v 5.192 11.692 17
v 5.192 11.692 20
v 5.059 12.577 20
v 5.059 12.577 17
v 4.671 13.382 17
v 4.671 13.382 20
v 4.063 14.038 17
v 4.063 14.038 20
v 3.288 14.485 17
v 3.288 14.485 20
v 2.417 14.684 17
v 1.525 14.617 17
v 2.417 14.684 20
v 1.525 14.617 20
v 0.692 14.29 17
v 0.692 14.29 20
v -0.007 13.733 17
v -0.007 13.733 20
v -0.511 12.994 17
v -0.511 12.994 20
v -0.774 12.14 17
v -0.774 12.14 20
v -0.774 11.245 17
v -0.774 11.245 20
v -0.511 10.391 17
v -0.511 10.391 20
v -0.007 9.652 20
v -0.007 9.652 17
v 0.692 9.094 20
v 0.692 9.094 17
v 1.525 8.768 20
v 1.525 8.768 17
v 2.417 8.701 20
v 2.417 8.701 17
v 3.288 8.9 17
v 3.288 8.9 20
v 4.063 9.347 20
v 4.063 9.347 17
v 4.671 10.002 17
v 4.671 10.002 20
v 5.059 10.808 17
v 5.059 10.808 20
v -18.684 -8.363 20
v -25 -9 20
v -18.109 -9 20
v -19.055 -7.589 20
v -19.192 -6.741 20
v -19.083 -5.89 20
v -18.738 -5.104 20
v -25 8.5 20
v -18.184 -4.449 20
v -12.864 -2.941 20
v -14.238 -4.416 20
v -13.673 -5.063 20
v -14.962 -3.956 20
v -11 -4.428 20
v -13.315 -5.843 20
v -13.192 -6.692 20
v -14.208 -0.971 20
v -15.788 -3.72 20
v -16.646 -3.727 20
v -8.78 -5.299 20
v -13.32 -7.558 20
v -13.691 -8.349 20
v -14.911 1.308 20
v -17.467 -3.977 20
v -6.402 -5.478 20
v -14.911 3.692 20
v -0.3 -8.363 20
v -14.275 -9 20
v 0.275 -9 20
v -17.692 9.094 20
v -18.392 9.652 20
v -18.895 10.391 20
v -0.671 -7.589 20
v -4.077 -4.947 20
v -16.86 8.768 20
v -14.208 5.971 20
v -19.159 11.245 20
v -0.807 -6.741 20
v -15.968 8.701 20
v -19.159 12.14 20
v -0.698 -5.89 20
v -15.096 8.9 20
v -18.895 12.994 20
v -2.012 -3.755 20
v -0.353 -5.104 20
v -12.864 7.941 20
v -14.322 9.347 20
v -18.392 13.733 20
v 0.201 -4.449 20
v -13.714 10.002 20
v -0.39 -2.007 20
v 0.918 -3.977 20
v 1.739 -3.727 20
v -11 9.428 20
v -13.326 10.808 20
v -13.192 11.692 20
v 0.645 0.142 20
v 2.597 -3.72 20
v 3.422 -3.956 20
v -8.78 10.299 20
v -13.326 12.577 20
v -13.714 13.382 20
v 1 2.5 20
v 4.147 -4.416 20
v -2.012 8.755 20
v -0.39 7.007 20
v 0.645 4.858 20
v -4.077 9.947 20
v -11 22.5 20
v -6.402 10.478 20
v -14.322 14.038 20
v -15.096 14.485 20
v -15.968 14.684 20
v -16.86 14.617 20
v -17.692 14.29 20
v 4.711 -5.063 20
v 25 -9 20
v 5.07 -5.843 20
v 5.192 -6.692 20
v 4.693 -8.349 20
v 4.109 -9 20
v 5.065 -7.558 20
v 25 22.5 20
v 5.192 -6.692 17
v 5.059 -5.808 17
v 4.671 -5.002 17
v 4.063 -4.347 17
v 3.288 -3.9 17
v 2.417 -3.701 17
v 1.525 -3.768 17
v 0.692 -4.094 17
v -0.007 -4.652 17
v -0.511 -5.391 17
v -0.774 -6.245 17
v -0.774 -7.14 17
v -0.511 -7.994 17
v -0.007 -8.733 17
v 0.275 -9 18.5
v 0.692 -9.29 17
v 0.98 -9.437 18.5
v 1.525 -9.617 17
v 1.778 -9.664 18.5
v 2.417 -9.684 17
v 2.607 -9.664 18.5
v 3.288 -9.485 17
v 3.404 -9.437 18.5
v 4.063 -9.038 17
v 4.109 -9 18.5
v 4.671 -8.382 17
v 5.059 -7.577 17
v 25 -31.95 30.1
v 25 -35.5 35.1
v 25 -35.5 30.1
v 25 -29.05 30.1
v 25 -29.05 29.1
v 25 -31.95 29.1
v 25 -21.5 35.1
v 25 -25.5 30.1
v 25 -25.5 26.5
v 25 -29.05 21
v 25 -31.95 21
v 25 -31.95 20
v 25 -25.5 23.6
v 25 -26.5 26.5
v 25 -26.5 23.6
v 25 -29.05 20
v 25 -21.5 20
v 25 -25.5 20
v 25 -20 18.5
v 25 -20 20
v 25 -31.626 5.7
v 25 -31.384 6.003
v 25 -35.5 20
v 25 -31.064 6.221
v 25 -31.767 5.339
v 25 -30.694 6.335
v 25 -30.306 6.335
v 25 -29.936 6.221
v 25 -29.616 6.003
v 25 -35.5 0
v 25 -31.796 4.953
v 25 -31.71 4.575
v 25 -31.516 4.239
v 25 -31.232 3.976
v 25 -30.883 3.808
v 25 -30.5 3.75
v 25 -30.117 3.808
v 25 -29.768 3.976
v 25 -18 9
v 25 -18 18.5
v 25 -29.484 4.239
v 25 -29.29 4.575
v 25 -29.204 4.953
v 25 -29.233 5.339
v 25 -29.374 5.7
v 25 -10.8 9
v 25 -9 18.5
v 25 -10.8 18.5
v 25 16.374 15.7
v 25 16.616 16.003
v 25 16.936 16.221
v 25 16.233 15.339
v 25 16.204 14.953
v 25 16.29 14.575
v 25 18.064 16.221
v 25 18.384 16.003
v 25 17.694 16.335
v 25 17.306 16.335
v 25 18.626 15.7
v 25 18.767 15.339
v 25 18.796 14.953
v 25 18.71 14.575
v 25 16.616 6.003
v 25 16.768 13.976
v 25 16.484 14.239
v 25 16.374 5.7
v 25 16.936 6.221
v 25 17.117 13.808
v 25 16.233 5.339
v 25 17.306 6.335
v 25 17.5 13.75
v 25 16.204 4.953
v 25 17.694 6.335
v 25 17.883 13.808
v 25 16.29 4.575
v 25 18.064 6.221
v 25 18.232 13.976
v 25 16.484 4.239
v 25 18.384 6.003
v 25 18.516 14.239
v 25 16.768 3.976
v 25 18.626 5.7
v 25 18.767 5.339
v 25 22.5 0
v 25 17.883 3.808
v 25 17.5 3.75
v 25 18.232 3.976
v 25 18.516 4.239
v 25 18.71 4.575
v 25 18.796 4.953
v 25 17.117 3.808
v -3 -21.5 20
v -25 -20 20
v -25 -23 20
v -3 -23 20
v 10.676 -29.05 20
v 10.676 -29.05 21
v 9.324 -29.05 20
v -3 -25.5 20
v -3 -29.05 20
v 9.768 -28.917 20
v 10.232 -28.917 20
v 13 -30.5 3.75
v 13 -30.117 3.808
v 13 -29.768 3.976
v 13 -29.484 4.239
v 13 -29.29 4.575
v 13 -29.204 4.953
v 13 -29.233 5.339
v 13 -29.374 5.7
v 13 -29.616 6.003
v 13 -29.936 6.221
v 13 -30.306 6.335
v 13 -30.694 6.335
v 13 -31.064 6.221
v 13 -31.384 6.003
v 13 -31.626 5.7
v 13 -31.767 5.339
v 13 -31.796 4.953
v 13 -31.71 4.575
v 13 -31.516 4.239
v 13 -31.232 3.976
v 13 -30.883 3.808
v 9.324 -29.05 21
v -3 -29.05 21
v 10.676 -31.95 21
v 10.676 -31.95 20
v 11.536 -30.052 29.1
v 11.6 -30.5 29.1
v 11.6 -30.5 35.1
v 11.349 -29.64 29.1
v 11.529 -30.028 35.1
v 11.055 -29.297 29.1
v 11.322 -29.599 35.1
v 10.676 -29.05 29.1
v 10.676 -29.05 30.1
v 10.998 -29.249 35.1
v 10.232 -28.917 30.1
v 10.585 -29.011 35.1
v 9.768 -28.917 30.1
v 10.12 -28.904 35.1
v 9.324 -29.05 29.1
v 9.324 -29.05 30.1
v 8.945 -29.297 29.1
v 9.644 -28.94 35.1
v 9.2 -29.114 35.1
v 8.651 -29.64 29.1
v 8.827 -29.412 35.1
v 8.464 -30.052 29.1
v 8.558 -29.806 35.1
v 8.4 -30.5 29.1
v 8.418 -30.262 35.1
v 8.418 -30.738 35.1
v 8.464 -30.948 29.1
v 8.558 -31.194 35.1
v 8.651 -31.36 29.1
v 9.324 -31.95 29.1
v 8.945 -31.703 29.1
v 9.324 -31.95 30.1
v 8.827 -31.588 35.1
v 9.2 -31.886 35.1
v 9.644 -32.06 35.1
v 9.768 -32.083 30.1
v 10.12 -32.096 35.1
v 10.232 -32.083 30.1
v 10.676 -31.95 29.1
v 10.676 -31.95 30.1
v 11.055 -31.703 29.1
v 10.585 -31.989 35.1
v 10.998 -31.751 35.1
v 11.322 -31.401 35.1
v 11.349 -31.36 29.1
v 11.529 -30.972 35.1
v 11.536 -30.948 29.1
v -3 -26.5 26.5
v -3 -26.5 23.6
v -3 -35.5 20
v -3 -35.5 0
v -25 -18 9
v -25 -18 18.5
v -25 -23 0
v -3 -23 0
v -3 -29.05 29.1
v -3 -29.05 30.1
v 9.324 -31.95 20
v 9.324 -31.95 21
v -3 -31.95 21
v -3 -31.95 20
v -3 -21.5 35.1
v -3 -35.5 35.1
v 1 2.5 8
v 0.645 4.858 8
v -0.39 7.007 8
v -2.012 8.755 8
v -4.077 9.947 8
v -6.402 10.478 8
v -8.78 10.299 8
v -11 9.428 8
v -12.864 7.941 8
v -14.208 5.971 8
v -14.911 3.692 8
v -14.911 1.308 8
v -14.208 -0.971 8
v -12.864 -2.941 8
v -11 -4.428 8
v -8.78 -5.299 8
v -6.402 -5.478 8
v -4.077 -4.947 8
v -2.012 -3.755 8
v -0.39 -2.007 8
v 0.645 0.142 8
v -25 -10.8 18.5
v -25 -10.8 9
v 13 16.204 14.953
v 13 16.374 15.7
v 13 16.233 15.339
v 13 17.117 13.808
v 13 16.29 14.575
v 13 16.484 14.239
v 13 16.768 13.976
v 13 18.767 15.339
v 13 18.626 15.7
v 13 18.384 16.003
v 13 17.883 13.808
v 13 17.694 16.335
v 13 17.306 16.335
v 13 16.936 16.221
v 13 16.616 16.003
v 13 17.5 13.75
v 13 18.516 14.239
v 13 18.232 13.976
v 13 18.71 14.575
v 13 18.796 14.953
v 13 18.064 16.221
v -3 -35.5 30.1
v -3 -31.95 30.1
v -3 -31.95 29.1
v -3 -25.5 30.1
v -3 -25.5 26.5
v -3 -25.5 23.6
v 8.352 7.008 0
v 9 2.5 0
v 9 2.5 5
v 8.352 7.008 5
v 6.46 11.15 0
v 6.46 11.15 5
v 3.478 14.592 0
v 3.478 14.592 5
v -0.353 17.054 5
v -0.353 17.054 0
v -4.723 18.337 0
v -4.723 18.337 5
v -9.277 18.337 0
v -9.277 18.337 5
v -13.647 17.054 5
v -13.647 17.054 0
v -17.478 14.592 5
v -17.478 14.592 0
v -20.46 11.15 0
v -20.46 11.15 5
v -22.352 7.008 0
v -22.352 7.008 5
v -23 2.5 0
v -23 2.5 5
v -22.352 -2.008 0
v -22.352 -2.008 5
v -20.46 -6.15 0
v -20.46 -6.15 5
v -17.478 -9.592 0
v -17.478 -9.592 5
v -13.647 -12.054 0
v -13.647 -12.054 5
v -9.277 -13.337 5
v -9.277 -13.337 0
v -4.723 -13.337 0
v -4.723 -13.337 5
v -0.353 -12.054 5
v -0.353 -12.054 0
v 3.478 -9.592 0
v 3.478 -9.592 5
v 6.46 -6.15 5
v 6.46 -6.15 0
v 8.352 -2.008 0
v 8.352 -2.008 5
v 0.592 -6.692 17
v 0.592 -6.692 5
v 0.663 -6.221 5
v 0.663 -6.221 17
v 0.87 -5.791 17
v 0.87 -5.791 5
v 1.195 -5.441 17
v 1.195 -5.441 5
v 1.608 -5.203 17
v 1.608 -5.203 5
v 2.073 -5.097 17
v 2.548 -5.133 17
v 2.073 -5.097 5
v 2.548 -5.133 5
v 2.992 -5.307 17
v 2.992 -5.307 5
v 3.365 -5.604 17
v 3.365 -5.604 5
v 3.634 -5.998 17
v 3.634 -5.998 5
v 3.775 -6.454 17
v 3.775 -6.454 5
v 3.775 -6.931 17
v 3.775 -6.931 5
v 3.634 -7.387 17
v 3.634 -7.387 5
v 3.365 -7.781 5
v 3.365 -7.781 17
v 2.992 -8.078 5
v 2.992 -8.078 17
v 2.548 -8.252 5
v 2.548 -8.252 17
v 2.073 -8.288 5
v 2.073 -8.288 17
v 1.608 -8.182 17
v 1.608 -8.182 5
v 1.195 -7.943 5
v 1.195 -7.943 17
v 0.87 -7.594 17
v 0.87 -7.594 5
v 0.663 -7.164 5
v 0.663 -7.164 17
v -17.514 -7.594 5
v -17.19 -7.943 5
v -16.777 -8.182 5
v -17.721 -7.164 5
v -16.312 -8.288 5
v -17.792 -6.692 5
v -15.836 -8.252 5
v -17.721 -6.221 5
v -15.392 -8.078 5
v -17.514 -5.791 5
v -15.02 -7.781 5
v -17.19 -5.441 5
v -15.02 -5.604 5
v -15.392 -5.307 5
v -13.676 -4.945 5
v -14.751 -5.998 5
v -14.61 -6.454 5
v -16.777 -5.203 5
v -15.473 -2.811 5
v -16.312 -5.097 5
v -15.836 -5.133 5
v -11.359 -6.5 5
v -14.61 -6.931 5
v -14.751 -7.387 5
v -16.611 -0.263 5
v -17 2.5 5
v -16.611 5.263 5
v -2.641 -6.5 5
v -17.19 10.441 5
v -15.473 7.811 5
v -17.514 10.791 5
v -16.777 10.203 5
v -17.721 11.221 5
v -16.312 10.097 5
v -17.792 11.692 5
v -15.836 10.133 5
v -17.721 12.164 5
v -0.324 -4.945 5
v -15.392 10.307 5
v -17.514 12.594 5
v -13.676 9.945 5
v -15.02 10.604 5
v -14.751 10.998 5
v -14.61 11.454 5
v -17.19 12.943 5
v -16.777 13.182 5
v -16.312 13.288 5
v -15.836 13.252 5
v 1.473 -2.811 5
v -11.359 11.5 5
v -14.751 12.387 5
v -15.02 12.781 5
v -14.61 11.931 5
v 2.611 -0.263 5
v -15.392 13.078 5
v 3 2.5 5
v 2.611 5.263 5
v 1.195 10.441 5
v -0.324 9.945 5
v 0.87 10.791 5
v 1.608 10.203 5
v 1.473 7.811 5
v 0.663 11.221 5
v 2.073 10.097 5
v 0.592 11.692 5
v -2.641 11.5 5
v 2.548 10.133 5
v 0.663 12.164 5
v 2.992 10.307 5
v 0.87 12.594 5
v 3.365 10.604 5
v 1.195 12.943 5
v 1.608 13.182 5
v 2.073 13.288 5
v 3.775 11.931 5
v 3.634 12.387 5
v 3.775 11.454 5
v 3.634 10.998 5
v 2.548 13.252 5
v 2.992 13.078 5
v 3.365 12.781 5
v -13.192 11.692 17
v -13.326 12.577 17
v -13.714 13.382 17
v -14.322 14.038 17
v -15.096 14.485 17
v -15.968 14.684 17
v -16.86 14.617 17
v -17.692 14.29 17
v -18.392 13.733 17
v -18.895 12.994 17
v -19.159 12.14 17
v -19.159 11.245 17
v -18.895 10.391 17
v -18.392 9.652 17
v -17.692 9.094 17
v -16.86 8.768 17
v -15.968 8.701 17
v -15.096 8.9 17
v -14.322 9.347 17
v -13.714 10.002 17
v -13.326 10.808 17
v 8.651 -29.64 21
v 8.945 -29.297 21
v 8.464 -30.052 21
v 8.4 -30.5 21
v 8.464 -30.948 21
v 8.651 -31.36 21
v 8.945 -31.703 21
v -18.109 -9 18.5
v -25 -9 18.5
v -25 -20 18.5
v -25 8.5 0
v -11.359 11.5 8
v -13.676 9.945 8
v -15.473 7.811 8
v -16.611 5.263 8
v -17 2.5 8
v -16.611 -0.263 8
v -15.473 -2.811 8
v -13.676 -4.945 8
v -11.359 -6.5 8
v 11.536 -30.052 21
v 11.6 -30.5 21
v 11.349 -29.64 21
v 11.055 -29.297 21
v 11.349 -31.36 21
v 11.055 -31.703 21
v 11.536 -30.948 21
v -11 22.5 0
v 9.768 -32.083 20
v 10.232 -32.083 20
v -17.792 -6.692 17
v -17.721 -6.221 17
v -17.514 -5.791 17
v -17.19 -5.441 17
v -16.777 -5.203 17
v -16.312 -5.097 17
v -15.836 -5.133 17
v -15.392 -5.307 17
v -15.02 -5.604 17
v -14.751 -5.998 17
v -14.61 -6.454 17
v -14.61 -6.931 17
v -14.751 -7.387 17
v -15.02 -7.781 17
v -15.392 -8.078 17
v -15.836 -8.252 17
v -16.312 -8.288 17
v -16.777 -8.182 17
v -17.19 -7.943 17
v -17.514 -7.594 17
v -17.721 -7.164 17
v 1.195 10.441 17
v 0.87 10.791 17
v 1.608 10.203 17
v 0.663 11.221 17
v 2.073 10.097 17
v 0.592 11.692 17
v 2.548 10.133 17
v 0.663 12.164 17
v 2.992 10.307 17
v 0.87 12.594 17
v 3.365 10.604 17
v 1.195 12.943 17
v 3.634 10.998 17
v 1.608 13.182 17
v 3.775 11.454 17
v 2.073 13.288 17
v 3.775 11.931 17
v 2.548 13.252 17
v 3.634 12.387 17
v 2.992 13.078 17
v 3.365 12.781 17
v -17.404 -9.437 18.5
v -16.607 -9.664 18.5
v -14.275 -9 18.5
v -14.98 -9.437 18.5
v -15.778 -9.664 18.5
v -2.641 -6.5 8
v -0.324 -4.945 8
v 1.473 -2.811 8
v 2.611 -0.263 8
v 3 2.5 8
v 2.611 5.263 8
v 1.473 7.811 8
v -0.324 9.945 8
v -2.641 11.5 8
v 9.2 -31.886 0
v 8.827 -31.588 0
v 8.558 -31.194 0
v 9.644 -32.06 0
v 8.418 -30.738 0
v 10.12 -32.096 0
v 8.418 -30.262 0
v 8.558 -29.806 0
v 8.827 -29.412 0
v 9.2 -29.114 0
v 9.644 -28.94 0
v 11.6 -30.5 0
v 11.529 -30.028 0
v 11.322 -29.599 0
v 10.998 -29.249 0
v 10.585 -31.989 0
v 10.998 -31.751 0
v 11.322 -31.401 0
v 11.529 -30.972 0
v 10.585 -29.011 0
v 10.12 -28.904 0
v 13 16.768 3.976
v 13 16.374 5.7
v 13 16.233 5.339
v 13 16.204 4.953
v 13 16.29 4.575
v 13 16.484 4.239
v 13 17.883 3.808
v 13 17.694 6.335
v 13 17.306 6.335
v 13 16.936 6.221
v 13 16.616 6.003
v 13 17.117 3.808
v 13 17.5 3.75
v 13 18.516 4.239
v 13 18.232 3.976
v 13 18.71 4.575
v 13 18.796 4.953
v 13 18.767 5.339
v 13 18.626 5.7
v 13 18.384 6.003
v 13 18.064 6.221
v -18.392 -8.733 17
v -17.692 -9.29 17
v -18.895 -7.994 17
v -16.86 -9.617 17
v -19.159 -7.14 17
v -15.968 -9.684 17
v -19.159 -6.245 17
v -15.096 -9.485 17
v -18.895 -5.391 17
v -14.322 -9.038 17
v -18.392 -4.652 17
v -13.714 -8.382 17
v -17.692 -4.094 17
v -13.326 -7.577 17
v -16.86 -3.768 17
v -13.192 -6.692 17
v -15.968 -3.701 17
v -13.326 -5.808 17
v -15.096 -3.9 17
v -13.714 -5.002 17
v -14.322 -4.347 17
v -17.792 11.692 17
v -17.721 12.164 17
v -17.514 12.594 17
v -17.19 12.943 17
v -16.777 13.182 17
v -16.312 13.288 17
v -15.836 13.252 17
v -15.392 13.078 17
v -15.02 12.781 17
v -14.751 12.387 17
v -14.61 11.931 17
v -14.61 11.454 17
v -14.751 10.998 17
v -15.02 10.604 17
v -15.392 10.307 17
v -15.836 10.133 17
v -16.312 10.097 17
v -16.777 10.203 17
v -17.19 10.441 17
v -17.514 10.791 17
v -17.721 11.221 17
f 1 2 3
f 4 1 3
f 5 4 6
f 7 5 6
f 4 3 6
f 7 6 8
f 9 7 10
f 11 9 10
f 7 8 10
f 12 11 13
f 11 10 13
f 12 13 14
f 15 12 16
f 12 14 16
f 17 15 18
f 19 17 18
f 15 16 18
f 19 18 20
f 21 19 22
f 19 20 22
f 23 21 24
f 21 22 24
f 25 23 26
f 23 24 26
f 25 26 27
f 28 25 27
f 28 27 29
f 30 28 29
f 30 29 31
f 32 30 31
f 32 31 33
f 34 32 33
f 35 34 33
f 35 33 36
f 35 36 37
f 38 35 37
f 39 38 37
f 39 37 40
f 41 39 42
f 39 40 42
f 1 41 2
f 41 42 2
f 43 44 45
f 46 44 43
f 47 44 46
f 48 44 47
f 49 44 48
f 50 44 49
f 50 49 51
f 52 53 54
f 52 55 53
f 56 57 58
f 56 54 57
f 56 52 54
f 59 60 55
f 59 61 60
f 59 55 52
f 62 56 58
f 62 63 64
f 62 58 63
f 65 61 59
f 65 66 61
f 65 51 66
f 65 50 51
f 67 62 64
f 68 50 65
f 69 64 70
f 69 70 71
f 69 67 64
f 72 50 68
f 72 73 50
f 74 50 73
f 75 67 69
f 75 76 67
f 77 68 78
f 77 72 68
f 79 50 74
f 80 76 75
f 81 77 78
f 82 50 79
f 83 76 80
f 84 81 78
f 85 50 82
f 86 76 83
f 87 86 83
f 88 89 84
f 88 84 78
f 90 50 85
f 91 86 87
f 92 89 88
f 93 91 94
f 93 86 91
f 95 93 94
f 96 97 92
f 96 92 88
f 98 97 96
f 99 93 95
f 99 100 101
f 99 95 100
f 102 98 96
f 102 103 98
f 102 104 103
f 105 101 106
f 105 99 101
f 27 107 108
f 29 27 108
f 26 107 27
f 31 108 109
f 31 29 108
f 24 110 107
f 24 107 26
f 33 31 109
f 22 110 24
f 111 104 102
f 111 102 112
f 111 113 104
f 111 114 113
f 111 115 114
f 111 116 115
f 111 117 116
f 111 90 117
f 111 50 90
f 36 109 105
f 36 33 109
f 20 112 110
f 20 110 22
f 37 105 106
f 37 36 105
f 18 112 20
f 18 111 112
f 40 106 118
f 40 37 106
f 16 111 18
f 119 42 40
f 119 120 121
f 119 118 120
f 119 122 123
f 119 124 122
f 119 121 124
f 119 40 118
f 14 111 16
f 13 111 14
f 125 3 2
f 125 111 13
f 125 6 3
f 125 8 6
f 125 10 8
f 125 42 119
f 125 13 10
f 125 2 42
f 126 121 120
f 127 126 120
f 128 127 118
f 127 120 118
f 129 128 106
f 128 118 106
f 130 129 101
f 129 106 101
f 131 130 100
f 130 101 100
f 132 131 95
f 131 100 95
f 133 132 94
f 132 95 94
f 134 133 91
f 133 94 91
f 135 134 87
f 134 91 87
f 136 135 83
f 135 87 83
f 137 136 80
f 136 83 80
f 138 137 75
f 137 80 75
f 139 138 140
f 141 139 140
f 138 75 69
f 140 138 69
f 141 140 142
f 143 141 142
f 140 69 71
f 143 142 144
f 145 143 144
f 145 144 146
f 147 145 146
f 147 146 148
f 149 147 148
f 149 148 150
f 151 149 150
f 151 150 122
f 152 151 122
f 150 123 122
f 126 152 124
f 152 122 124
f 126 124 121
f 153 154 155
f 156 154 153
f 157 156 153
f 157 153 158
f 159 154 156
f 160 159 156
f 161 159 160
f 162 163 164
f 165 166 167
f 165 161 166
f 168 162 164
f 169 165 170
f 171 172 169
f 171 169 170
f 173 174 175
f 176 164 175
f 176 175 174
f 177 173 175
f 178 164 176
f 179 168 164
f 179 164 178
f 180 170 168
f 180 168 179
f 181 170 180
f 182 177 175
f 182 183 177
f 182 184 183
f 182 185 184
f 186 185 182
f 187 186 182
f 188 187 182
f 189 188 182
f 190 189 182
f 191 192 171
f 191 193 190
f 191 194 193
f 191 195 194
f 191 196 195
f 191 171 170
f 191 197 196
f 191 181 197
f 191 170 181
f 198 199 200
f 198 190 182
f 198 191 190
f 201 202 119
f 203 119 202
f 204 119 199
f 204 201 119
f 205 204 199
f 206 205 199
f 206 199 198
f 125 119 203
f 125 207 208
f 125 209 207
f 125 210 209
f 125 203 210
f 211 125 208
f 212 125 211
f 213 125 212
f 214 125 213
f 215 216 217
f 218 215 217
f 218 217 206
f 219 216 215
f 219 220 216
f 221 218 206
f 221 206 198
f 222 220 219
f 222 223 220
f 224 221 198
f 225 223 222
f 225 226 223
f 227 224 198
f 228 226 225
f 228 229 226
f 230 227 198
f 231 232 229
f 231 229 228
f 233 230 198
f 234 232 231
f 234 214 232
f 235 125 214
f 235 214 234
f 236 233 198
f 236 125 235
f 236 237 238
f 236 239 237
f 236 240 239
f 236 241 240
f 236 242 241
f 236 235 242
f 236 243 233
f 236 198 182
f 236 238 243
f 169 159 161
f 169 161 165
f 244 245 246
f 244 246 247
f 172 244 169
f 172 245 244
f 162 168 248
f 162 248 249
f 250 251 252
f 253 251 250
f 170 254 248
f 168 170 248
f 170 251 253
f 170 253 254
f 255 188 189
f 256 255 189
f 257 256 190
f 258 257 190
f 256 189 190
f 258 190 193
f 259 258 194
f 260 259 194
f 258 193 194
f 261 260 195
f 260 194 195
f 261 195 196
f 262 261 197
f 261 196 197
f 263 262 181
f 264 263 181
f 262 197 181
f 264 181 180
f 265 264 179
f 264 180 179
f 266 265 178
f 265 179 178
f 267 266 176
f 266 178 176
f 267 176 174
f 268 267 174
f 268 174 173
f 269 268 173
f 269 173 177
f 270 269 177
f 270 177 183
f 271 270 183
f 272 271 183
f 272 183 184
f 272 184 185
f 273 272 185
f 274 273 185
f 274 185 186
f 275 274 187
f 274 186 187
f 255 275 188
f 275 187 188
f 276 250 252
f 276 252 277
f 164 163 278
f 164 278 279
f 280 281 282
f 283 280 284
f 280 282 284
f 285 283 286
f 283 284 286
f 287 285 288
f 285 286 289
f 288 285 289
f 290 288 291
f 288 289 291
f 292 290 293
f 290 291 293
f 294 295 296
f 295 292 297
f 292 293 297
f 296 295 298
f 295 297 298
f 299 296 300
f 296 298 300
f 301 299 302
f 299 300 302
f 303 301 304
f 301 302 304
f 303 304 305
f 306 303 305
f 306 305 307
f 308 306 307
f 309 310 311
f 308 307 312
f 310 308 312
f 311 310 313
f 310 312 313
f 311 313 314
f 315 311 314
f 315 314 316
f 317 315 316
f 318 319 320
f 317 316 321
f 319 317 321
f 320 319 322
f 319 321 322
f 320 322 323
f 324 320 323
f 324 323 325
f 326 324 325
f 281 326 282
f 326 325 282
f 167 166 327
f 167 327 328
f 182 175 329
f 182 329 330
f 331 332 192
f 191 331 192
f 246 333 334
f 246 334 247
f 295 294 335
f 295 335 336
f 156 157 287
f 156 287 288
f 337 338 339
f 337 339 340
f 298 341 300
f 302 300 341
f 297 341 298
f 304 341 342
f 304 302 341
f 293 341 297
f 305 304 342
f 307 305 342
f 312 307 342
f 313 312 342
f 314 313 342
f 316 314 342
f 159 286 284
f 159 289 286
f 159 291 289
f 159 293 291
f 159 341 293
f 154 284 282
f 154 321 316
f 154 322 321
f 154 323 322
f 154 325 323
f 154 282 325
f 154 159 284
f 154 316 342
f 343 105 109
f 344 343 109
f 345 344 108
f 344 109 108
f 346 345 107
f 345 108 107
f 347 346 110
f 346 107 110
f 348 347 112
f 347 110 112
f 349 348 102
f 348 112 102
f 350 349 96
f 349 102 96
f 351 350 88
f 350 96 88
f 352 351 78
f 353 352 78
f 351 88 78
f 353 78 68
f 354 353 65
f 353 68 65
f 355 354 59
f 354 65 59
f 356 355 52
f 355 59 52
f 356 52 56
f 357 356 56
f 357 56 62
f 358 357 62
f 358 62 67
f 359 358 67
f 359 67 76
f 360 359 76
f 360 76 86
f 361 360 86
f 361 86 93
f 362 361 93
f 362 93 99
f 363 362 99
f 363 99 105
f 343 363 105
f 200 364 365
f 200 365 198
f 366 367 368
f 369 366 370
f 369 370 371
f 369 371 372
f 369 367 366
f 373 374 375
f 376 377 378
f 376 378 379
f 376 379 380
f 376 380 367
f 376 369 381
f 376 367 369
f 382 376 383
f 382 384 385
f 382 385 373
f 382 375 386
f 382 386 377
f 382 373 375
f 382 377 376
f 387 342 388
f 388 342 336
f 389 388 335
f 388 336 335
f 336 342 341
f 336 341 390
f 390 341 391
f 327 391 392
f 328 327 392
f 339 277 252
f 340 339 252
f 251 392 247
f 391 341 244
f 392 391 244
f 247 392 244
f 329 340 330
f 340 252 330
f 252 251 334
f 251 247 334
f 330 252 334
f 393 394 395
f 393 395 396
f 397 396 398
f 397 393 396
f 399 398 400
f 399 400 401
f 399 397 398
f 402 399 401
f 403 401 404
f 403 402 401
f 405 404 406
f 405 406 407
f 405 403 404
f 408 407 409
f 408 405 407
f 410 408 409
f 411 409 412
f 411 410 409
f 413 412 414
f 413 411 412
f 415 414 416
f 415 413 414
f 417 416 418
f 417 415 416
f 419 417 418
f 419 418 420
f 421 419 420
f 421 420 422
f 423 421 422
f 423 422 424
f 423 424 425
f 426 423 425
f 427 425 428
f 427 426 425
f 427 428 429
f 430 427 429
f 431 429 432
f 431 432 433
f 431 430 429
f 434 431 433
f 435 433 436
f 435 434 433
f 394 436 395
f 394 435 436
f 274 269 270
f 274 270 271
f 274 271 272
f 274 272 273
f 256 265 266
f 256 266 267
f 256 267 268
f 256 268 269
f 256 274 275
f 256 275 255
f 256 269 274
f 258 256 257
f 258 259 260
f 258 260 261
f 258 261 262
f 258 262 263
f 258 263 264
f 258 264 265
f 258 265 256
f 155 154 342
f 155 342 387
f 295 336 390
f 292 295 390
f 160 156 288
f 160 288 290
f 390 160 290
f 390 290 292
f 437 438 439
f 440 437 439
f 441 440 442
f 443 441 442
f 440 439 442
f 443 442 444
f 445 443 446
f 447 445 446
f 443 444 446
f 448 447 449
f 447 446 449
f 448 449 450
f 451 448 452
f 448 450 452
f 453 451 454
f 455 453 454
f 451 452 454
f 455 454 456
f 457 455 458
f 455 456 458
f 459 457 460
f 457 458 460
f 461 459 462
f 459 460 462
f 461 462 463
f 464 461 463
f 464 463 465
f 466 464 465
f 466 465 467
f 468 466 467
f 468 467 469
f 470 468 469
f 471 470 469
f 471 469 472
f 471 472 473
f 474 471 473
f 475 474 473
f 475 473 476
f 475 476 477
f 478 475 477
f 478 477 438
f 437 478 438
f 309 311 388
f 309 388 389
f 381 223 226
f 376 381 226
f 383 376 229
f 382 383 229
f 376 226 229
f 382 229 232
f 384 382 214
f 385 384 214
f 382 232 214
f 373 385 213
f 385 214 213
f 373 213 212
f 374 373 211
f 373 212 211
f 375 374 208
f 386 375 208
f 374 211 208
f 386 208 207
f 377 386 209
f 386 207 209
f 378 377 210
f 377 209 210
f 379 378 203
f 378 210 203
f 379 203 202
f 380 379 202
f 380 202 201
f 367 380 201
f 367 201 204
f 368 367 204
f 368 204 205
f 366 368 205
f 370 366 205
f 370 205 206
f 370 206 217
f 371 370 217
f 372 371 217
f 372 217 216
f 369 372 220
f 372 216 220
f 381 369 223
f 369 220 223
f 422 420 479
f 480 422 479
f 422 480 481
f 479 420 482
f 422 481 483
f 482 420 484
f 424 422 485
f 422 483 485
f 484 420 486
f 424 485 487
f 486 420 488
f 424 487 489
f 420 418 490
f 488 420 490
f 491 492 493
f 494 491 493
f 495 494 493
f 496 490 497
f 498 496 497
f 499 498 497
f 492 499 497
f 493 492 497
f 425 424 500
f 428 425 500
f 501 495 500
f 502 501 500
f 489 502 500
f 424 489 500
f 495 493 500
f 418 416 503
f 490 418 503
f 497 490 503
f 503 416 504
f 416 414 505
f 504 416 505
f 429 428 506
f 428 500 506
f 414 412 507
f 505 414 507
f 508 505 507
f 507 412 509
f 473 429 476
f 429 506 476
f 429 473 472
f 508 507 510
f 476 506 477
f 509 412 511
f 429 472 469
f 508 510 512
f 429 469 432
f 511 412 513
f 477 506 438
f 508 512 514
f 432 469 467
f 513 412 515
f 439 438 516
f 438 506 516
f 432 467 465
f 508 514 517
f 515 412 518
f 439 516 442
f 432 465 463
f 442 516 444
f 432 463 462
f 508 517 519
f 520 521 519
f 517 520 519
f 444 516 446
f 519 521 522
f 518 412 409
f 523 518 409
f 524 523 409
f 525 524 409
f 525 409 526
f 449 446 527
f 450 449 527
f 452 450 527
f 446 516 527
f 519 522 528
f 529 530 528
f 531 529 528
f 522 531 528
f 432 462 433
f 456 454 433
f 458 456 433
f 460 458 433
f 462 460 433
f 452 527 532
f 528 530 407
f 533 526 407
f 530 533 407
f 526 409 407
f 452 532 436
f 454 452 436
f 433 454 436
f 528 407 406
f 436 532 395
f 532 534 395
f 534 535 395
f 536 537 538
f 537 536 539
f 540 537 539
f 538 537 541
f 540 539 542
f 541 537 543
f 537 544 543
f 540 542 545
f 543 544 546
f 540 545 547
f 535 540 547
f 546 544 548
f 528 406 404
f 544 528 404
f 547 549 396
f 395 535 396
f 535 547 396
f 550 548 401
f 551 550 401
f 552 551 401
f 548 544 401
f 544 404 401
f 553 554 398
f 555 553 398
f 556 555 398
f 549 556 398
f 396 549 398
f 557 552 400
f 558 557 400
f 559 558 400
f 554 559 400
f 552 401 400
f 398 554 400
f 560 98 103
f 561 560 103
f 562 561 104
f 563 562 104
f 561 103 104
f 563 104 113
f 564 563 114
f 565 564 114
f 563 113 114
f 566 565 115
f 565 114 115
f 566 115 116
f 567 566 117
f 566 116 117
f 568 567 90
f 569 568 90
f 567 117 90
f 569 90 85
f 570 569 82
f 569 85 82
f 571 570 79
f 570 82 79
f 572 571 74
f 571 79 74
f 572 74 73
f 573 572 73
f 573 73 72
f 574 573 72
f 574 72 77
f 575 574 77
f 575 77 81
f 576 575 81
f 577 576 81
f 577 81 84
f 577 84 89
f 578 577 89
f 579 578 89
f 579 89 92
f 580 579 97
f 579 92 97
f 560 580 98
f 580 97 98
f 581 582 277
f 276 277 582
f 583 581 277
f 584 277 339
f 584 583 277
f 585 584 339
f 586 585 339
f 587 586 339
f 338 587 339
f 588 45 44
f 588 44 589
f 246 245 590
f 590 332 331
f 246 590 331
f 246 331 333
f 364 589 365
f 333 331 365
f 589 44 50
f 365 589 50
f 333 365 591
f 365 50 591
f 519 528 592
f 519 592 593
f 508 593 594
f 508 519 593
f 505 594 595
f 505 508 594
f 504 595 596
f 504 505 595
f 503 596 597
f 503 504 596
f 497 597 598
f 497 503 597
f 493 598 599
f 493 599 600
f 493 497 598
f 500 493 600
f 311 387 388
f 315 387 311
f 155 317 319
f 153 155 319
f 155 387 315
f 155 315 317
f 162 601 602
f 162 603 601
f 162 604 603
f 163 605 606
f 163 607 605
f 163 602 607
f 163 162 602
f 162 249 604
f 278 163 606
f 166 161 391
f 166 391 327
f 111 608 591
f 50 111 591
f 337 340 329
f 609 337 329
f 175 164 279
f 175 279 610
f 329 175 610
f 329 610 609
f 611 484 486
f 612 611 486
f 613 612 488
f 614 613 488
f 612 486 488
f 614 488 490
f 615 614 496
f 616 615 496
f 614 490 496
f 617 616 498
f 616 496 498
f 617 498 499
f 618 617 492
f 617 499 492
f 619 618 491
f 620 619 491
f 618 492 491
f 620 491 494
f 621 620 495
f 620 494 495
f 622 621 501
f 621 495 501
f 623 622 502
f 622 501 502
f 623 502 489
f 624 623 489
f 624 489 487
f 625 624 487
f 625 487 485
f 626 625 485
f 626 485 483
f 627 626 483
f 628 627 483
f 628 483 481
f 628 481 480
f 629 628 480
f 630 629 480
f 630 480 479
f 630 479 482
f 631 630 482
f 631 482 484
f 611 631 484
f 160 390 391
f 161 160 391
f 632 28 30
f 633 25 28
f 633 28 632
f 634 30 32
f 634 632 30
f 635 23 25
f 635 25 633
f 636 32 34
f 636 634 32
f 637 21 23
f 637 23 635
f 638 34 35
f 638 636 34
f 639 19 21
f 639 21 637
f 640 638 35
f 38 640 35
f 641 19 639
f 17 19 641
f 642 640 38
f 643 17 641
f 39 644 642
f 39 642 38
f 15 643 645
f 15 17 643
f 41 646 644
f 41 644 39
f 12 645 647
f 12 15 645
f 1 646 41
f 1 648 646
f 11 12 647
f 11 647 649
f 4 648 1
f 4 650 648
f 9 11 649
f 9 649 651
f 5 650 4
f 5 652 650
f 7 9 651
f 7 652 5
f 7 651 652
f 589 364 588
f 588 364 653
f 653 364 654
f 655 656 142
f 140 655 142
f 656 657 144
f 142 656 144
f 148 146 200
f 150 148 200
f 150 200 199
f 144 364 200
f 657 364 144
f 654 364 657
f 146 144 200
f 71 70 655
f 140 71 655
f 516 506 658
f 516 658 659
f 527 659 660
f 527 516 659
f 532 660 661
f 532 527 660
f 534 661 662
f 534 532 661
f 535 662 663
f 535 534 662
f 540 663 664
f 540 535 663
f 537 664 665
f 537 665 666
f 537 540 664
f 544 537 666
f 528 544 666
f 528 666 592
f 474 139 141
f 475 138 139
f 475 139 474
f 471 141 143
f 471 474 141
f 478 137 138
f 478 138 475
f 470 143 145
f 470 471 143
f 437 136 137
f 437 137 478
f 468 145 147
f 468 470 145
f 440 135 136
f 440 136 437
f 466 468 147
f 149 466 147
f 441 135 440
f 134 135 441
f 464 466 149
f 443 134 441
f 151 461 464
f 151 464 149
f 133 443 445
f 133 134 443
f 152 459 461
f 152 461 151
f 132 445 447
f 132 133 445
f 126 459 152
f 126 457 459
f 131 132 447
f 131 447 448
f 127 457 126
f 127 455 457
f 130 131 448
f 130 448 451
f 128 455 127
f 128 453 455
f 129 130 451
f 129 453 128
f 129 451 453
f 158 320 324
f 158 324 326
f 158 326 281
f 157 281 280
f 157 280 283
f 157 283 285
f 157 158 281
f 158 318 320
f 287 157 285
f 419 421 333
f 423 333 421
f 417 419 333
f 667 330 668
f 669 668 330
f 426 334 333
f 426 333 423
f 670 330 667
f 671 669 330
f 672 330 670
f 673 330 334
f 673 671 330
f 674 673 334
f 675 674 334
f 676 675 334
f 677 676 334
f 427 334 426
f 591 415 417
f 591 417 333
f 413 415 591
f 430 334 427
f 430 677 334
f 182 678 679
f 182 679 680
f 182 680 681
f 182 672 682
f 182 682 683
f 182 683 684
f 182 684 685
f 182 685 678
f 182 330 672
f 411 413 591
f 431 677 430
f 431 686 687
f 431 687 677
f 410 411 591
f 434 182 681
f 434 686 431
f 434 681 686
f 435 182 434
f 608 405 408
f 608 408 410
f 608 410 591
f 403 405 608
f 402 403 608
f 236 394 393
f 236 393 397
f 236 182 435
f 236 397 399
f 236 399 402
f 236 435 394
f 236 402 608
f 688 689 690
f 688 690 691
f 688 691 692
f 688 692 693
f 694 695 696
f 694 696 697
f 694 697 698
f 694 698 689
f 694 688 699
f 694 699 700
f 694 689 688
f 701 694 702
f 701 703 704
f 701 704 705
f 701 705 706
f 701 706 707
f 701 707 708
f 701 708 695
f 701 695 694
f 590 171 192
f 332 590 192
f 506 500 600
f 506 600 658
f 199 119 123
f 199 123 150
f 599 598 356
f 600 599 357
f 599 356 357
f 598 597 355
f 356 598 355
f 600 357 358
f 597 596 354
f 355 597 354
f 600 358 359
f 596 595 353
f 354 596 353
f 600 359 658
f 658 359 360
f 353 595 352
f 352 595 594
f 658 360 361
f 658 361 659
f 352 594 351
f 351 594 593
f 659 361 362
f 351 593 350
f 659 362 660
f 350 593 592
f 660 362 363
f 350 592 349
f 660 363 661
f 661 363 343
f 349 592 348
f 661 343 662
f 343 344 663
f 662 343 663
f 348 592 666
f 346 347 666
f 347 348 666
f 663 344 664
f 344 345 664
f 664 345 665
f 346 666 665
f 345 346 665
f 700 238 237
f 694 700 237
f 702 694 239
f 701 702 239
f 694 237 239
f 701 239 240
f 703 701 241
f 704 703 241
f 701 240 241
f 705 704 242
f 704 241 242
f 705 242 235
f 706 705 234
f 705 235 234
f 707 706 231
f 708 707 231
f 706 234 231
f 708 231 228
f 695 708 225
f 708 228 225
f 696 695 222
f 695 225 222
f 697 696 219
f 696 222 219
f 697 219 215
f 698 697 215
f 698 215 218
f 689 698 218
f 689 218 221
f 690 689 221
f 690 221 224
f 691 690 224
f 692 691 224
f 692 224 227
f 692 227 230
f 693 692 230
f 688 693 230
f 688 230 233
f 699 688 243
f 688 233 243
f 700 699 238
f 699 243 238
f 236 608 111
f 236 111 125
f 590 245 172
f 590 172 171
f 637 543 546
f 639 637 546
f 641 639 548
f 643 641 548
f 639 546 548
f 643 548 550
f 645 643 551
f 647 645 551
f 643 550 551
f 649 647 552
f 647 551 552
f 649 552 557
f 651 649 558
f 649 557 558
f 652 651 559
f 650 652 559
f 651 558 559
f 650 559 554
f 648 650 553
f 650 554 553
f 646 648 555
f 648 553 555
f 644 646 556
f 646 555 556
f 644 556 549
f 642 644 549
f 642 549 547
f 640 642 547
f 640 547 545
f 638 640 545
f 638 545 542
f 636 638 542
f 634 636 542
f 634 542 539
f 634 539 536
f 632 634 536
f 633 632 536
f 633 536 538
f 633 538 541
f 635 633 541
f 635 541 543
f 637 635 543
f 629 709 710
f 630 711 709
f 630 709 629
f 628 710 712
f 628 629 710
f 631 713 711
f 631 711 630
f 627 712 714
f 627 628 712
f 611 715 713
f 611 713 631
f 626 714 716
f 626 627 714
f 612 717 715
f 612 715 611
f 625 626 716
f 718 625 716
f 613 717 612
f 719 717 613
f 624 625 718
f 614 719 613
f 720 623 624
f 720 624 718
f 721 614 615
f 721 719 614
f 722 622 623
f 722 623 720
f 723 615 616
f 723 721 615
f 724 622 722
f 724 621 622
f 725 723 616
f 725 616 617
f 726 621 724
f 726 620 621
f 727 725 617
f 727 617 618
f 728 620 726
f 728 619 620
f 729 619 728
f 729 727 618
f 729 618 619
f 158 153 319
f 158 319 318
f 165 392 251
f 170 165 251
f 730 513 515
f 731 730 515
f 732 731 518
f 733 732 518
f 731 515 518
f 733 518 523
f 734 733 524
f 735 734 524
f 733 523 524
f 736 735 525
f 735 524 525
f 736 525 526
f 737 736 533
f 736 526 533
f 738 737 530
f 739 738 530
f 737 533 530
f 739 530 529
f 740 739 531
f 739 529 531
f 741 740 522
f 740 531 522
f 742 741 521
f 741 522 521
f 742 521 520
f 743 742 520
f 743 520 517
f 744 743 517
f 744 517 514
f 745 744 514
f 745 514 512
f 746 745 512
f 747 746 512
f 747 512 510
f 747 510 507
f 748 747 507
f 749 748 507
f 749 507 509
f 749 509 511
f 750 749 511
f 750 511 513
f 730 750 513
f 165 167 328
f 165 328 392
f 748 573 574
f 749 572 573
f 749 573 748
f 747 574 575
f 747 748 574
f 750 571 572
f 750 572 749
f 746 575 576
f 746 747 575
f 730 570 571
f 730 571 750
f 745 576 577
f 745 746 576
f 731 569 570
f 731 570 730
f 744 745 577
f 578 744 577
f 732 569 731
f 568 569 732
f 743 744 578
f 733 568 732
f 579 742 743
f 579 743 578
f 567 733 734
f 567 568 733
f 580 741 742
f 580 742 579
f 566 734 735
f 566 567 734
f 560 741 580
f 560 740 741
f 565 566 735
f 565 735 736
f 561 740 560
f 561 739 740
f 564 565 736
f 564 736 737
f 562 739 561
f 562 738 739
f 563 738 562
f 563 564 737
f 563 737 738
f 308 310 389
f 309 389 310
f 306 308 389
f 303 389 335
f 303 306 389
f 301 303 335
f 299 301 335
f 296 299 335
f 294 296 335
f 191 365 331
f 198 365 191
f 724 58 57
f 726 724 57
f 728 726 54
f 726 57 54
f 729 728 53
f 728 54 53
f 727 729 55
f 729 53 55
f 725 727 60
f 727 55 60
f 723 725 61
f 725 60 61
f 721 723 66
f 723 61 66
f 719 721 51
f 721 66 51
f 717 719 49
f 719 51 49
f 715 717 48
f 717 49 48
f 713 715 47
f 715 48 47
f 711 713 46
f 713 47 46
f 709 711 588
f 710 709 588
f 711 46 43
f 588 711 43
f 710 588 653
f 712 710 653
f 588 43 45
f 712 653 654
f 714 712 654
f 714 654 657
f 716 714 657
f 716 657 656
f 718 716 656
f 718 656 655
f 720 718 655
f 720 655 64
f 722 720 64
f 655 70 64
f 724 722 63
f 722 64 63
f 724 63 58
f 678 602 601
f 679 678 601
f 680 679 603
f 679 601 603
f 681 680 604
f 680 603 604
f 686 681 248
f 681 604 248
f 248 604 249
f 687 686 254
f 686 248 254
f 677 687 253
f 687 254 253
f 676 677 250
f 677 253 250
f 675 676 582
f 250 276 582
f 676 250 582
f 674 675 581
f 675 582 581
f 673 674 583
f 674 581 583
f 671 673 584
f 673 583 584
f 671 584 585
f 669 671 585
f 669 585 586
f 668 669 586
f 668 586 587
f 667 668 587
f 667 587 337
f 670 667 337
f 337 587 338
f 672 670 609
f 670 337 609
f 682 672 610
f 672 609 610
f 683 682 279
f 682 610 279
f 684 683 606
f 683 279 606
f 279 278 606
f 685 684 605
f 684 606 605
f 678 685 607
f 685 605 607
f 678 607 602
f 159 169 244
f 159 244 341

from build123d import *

# Parameters (mm, degrees)
ESQUISSE1_W                     = 50
ESQUISSE1_H                     = 45
MAIN_EXTRUSION_DEPTH            = 20
ESQUISSE5_R                     = 8
GEAR_LINEAR_HOLES_DEPTH         = 21
FIXING_EXTRUSION_DEPTH          = 25
ESQUISSE13_W                    = 50
ESQUISSE13_H                    = 7.2
ROLLINGBALLHORIZONTALHOLE_DEPTH = 11
FRONTHOLE_DEPTH                 = 22
ESQUISSE15_R                    = 1.6
BOTTOMFIXINGHOLE_DEPTH          = 36.1
ESQUISSE12_R                    = 16
REDUCTORMAINHOLE_DEPTH          = 5
REDUCTORFRONTFIXINGHOLE_DEPTH   = 3
ESQUISSE17_R                    = 1.6
MOTORFIXINGHOLE_DEPTH           = 31.1
ESQUISSE19_R                    = 3
ENL_V_MAT_EXTRU_5_DEPTH         = 3
SKETCH2_W                       = 1.5
SKETCH2_H                       = 11
CUTFORMAKERBEAMPROFILE_DEPTH    = 51
CUTFORDISTRIBUTORGRABBER_DEPTH  = 21
SKETCH4_R                       = 1.3
HOLETOBLOCKBEHIND_DEPTH         = 12


with BuildPart() as part:
    # Esquisse1 → Main Extrusion (new body)
    with BuildSketch(Plane.XY):
        Rectangle(ESQUISSE1_W, ESQUISSE1_H)
    extrude(amount=MAIN_EXTRUSION_DEPTH)

    # Esquisse5 → Gear Linear Holes (cut, through all)
    with BuildSketch(Plane.XY.offset(20)):
        with Locations((-7, 2.5)):
            Circle(ESQUISSE5_R)
    extrude(amount=-GEAR_LINEAR_HOLES_DEPTH, mode=Mode.SUBTRACT)

    # Esquisse8 → Fixing Extrusion (add, symmetric)
    with BuildSketch(Plane(origin=(0, 0, 0), x_dir=(0, 0, -1), z_dir=(1, 0, 0))):
        Polygon((-20, -25.5), (-20, -29.05), (-21, -29.05), (-21, -31.95), (-20, -31.95), (-20, -35.5), (0, -35.5), (0, -21.5), (-35.1, -21.5), (-35.1, -35.5), (-30.1, -35.5), (-30.1, -31.95), (-29.1, -31.95), (-29.1, -29.05), (-30.1, -29.05), (-30.1, -25.5), (-26.5, -25.5), (-26.5, -26.5), (-23.6, -26.5), (-23.6, -25.5), align=None)
    extrude(amount=FIXING_EXTRUSION_DEPTH, both=True)

    # Esquisse13 → RollingBallHorizontalHole (cut)
    with BuildSketch(Plane.XY.offset(20)):
        with Locations((0, -14.4)):
            Rectangle(ESQUISSE13_W, ESQUISSE13_H)
    extrude(amount=-ROLLINGBALLHORIZONTALHOLE_DEPTH, mode=Mode.SUBTRACT)

    # Esquisse14 → FrontHole (cut)
    with BuildSketch(Plane.ZY.offset(25)):
        Polygon((0, -23), (20, -23), (20, -18), (35.1, -18), (35.1, -35.5), (0, -35.5), align=None)
    extrude(amount=-FRONTHOLE_DEPTH, mode=Mode.SUBTRACT)

    # Esquisse15 → BottomFixingHole (cut, through all)
    with BuildSketch(Plane.XY.offset(35.1)):
        with Locations((10, -30.5)):
            Circle(ESQUISSE15_R)
    extrude(amount=-BOTTOMFIXINGHOLE_DEPTH, mode=Mode.SUBTRACT)

    # Esquisse12 → ReductorMainHole (cut)
    with BuildSketch(Plane.XY):
        with Locations((-7, 2.5)):
            Circle(ESQUISSE12_R)
    extrude(amount=REDUCTORMAINHOLE_DEPTH, mode=Mode.SUBTRACT)

    # Esquisse16 → ReductorFrontFixingHole (cut)
    with BuildSketch(Plane(origin=(0, 0, 5), x_dir=(-1, 0, 0), z_dir=(0, 0, -1))):
        with BuildLine():
            Line((2.641101056, 11.5), (11.358898944, 11.5))
            ThreePointArc((11.358898944, 11.5), (17, 2.5), (11.358898944, -6.5))
            Line((11.358898944, -6.5), (2.641101056, -6.5))
            ThreePointArc((2.641101056, -6.5), (-3, 2.5), (2.641101056, 11.5))
        make_face()
    extrude(amount=-REDUCTORFRONTFIXINGHOLE_DEPTH, mode=Mode.SUBTRACT)

    # Esquisse17 → MotorFixingHole (cut, through all)
    with BuildSketch(Plane(origin=(0, 0, 5), x_dir=(-1, 0, 0), z_dir=(0, 0, -1))):
        with Locations((-2.192388155, 11.692388155)):
            Circle(ESQUISSE17_R)
        with Locations((16.192388155, 11.692388155)):
            Circle(ESQUISSE17_R)
        with Locations((-2.192388155, -6.692388155)):
            Circle(ESQUISSE17_R)
        with Locations((16.192388155, -6.692388155)):
            Circle(ESQUISSE17_R)
    extrude(amount=-MOTORFIXINGHOLE_DEPTH, mode=Mode.SUBTRACT)

    # Esquisse19 → Enlèv. mat.-Extru.5 (cut)
    with BuildSketch(Plane.XY.offset(20)):
        with Locations((-16.192388155, 11.692388155)):
            Circle(ESQUISSE19_R)
        with Locations((2.192388155, 11.692388155)):
            Circle(ESQUISSE19_R)
        with Locations((-16.192388155, -6.692388155)):
            Circle(ESQUISSE19_R)
        with Locations((2.192388155, -6.692388155)):
            Circle(ESQUISSE19_R)
    extrude(amount=-ENL_V_MAT_EXTRU_5_DEPTH, mode=Mode.SUBTRACT)

    # Sketch2 → CutForMakerBeamProfile (cut, through all)
    with BuildSketch(Plane(origin=(25, 0, 0), x_dir=(0, 0, -1), z_dir=(1, 0, 0))):
        with Locations((-19.25, -14.5)):
            Rectangle(SKETCH2_W, SKETCH2_H)
    extrude(amount=-CUTFORMAKERBEAMPROFILE_DEPTH, mode=Mode.SUBTRACT)

    # Sketch3 → CutForDistributorGrabber (cut, through all)
    with BuildSketch(Plane.XY.offset(20)):
        Polygon((-11, 22.5), (-25, 8.5), (-25, 22.5), align=None)
    extrude(amount=-CUTFORDISTRIBUTORGRABBER_DEPTH, mode=Mode.SUBTRACT)

    # Sketch4 → HoleToBlockBehind (cut)
    with BuildSketch(Plane(origin=(25, 0, 0), x_dir=(0, 0, -1), z_dir=(1, 0, 0))):
        with Locations((-5.05, -30.5)):
            Circle(SKETCH4_R)
        with Locations((-25.05, -30.5)):
            Circle(SKETCH4_R)
        with Locations((-5.05, 17.5)):
            Circle(SKETCH4_R)
        with Locations((-15.05, 17.5)):
            Circle(SKETCH4_R)
    extrude(amount=-HOLETOBLOCKBEHIND_DEPTH, mode=Mode.SUBTRACT)


solid = part.part
